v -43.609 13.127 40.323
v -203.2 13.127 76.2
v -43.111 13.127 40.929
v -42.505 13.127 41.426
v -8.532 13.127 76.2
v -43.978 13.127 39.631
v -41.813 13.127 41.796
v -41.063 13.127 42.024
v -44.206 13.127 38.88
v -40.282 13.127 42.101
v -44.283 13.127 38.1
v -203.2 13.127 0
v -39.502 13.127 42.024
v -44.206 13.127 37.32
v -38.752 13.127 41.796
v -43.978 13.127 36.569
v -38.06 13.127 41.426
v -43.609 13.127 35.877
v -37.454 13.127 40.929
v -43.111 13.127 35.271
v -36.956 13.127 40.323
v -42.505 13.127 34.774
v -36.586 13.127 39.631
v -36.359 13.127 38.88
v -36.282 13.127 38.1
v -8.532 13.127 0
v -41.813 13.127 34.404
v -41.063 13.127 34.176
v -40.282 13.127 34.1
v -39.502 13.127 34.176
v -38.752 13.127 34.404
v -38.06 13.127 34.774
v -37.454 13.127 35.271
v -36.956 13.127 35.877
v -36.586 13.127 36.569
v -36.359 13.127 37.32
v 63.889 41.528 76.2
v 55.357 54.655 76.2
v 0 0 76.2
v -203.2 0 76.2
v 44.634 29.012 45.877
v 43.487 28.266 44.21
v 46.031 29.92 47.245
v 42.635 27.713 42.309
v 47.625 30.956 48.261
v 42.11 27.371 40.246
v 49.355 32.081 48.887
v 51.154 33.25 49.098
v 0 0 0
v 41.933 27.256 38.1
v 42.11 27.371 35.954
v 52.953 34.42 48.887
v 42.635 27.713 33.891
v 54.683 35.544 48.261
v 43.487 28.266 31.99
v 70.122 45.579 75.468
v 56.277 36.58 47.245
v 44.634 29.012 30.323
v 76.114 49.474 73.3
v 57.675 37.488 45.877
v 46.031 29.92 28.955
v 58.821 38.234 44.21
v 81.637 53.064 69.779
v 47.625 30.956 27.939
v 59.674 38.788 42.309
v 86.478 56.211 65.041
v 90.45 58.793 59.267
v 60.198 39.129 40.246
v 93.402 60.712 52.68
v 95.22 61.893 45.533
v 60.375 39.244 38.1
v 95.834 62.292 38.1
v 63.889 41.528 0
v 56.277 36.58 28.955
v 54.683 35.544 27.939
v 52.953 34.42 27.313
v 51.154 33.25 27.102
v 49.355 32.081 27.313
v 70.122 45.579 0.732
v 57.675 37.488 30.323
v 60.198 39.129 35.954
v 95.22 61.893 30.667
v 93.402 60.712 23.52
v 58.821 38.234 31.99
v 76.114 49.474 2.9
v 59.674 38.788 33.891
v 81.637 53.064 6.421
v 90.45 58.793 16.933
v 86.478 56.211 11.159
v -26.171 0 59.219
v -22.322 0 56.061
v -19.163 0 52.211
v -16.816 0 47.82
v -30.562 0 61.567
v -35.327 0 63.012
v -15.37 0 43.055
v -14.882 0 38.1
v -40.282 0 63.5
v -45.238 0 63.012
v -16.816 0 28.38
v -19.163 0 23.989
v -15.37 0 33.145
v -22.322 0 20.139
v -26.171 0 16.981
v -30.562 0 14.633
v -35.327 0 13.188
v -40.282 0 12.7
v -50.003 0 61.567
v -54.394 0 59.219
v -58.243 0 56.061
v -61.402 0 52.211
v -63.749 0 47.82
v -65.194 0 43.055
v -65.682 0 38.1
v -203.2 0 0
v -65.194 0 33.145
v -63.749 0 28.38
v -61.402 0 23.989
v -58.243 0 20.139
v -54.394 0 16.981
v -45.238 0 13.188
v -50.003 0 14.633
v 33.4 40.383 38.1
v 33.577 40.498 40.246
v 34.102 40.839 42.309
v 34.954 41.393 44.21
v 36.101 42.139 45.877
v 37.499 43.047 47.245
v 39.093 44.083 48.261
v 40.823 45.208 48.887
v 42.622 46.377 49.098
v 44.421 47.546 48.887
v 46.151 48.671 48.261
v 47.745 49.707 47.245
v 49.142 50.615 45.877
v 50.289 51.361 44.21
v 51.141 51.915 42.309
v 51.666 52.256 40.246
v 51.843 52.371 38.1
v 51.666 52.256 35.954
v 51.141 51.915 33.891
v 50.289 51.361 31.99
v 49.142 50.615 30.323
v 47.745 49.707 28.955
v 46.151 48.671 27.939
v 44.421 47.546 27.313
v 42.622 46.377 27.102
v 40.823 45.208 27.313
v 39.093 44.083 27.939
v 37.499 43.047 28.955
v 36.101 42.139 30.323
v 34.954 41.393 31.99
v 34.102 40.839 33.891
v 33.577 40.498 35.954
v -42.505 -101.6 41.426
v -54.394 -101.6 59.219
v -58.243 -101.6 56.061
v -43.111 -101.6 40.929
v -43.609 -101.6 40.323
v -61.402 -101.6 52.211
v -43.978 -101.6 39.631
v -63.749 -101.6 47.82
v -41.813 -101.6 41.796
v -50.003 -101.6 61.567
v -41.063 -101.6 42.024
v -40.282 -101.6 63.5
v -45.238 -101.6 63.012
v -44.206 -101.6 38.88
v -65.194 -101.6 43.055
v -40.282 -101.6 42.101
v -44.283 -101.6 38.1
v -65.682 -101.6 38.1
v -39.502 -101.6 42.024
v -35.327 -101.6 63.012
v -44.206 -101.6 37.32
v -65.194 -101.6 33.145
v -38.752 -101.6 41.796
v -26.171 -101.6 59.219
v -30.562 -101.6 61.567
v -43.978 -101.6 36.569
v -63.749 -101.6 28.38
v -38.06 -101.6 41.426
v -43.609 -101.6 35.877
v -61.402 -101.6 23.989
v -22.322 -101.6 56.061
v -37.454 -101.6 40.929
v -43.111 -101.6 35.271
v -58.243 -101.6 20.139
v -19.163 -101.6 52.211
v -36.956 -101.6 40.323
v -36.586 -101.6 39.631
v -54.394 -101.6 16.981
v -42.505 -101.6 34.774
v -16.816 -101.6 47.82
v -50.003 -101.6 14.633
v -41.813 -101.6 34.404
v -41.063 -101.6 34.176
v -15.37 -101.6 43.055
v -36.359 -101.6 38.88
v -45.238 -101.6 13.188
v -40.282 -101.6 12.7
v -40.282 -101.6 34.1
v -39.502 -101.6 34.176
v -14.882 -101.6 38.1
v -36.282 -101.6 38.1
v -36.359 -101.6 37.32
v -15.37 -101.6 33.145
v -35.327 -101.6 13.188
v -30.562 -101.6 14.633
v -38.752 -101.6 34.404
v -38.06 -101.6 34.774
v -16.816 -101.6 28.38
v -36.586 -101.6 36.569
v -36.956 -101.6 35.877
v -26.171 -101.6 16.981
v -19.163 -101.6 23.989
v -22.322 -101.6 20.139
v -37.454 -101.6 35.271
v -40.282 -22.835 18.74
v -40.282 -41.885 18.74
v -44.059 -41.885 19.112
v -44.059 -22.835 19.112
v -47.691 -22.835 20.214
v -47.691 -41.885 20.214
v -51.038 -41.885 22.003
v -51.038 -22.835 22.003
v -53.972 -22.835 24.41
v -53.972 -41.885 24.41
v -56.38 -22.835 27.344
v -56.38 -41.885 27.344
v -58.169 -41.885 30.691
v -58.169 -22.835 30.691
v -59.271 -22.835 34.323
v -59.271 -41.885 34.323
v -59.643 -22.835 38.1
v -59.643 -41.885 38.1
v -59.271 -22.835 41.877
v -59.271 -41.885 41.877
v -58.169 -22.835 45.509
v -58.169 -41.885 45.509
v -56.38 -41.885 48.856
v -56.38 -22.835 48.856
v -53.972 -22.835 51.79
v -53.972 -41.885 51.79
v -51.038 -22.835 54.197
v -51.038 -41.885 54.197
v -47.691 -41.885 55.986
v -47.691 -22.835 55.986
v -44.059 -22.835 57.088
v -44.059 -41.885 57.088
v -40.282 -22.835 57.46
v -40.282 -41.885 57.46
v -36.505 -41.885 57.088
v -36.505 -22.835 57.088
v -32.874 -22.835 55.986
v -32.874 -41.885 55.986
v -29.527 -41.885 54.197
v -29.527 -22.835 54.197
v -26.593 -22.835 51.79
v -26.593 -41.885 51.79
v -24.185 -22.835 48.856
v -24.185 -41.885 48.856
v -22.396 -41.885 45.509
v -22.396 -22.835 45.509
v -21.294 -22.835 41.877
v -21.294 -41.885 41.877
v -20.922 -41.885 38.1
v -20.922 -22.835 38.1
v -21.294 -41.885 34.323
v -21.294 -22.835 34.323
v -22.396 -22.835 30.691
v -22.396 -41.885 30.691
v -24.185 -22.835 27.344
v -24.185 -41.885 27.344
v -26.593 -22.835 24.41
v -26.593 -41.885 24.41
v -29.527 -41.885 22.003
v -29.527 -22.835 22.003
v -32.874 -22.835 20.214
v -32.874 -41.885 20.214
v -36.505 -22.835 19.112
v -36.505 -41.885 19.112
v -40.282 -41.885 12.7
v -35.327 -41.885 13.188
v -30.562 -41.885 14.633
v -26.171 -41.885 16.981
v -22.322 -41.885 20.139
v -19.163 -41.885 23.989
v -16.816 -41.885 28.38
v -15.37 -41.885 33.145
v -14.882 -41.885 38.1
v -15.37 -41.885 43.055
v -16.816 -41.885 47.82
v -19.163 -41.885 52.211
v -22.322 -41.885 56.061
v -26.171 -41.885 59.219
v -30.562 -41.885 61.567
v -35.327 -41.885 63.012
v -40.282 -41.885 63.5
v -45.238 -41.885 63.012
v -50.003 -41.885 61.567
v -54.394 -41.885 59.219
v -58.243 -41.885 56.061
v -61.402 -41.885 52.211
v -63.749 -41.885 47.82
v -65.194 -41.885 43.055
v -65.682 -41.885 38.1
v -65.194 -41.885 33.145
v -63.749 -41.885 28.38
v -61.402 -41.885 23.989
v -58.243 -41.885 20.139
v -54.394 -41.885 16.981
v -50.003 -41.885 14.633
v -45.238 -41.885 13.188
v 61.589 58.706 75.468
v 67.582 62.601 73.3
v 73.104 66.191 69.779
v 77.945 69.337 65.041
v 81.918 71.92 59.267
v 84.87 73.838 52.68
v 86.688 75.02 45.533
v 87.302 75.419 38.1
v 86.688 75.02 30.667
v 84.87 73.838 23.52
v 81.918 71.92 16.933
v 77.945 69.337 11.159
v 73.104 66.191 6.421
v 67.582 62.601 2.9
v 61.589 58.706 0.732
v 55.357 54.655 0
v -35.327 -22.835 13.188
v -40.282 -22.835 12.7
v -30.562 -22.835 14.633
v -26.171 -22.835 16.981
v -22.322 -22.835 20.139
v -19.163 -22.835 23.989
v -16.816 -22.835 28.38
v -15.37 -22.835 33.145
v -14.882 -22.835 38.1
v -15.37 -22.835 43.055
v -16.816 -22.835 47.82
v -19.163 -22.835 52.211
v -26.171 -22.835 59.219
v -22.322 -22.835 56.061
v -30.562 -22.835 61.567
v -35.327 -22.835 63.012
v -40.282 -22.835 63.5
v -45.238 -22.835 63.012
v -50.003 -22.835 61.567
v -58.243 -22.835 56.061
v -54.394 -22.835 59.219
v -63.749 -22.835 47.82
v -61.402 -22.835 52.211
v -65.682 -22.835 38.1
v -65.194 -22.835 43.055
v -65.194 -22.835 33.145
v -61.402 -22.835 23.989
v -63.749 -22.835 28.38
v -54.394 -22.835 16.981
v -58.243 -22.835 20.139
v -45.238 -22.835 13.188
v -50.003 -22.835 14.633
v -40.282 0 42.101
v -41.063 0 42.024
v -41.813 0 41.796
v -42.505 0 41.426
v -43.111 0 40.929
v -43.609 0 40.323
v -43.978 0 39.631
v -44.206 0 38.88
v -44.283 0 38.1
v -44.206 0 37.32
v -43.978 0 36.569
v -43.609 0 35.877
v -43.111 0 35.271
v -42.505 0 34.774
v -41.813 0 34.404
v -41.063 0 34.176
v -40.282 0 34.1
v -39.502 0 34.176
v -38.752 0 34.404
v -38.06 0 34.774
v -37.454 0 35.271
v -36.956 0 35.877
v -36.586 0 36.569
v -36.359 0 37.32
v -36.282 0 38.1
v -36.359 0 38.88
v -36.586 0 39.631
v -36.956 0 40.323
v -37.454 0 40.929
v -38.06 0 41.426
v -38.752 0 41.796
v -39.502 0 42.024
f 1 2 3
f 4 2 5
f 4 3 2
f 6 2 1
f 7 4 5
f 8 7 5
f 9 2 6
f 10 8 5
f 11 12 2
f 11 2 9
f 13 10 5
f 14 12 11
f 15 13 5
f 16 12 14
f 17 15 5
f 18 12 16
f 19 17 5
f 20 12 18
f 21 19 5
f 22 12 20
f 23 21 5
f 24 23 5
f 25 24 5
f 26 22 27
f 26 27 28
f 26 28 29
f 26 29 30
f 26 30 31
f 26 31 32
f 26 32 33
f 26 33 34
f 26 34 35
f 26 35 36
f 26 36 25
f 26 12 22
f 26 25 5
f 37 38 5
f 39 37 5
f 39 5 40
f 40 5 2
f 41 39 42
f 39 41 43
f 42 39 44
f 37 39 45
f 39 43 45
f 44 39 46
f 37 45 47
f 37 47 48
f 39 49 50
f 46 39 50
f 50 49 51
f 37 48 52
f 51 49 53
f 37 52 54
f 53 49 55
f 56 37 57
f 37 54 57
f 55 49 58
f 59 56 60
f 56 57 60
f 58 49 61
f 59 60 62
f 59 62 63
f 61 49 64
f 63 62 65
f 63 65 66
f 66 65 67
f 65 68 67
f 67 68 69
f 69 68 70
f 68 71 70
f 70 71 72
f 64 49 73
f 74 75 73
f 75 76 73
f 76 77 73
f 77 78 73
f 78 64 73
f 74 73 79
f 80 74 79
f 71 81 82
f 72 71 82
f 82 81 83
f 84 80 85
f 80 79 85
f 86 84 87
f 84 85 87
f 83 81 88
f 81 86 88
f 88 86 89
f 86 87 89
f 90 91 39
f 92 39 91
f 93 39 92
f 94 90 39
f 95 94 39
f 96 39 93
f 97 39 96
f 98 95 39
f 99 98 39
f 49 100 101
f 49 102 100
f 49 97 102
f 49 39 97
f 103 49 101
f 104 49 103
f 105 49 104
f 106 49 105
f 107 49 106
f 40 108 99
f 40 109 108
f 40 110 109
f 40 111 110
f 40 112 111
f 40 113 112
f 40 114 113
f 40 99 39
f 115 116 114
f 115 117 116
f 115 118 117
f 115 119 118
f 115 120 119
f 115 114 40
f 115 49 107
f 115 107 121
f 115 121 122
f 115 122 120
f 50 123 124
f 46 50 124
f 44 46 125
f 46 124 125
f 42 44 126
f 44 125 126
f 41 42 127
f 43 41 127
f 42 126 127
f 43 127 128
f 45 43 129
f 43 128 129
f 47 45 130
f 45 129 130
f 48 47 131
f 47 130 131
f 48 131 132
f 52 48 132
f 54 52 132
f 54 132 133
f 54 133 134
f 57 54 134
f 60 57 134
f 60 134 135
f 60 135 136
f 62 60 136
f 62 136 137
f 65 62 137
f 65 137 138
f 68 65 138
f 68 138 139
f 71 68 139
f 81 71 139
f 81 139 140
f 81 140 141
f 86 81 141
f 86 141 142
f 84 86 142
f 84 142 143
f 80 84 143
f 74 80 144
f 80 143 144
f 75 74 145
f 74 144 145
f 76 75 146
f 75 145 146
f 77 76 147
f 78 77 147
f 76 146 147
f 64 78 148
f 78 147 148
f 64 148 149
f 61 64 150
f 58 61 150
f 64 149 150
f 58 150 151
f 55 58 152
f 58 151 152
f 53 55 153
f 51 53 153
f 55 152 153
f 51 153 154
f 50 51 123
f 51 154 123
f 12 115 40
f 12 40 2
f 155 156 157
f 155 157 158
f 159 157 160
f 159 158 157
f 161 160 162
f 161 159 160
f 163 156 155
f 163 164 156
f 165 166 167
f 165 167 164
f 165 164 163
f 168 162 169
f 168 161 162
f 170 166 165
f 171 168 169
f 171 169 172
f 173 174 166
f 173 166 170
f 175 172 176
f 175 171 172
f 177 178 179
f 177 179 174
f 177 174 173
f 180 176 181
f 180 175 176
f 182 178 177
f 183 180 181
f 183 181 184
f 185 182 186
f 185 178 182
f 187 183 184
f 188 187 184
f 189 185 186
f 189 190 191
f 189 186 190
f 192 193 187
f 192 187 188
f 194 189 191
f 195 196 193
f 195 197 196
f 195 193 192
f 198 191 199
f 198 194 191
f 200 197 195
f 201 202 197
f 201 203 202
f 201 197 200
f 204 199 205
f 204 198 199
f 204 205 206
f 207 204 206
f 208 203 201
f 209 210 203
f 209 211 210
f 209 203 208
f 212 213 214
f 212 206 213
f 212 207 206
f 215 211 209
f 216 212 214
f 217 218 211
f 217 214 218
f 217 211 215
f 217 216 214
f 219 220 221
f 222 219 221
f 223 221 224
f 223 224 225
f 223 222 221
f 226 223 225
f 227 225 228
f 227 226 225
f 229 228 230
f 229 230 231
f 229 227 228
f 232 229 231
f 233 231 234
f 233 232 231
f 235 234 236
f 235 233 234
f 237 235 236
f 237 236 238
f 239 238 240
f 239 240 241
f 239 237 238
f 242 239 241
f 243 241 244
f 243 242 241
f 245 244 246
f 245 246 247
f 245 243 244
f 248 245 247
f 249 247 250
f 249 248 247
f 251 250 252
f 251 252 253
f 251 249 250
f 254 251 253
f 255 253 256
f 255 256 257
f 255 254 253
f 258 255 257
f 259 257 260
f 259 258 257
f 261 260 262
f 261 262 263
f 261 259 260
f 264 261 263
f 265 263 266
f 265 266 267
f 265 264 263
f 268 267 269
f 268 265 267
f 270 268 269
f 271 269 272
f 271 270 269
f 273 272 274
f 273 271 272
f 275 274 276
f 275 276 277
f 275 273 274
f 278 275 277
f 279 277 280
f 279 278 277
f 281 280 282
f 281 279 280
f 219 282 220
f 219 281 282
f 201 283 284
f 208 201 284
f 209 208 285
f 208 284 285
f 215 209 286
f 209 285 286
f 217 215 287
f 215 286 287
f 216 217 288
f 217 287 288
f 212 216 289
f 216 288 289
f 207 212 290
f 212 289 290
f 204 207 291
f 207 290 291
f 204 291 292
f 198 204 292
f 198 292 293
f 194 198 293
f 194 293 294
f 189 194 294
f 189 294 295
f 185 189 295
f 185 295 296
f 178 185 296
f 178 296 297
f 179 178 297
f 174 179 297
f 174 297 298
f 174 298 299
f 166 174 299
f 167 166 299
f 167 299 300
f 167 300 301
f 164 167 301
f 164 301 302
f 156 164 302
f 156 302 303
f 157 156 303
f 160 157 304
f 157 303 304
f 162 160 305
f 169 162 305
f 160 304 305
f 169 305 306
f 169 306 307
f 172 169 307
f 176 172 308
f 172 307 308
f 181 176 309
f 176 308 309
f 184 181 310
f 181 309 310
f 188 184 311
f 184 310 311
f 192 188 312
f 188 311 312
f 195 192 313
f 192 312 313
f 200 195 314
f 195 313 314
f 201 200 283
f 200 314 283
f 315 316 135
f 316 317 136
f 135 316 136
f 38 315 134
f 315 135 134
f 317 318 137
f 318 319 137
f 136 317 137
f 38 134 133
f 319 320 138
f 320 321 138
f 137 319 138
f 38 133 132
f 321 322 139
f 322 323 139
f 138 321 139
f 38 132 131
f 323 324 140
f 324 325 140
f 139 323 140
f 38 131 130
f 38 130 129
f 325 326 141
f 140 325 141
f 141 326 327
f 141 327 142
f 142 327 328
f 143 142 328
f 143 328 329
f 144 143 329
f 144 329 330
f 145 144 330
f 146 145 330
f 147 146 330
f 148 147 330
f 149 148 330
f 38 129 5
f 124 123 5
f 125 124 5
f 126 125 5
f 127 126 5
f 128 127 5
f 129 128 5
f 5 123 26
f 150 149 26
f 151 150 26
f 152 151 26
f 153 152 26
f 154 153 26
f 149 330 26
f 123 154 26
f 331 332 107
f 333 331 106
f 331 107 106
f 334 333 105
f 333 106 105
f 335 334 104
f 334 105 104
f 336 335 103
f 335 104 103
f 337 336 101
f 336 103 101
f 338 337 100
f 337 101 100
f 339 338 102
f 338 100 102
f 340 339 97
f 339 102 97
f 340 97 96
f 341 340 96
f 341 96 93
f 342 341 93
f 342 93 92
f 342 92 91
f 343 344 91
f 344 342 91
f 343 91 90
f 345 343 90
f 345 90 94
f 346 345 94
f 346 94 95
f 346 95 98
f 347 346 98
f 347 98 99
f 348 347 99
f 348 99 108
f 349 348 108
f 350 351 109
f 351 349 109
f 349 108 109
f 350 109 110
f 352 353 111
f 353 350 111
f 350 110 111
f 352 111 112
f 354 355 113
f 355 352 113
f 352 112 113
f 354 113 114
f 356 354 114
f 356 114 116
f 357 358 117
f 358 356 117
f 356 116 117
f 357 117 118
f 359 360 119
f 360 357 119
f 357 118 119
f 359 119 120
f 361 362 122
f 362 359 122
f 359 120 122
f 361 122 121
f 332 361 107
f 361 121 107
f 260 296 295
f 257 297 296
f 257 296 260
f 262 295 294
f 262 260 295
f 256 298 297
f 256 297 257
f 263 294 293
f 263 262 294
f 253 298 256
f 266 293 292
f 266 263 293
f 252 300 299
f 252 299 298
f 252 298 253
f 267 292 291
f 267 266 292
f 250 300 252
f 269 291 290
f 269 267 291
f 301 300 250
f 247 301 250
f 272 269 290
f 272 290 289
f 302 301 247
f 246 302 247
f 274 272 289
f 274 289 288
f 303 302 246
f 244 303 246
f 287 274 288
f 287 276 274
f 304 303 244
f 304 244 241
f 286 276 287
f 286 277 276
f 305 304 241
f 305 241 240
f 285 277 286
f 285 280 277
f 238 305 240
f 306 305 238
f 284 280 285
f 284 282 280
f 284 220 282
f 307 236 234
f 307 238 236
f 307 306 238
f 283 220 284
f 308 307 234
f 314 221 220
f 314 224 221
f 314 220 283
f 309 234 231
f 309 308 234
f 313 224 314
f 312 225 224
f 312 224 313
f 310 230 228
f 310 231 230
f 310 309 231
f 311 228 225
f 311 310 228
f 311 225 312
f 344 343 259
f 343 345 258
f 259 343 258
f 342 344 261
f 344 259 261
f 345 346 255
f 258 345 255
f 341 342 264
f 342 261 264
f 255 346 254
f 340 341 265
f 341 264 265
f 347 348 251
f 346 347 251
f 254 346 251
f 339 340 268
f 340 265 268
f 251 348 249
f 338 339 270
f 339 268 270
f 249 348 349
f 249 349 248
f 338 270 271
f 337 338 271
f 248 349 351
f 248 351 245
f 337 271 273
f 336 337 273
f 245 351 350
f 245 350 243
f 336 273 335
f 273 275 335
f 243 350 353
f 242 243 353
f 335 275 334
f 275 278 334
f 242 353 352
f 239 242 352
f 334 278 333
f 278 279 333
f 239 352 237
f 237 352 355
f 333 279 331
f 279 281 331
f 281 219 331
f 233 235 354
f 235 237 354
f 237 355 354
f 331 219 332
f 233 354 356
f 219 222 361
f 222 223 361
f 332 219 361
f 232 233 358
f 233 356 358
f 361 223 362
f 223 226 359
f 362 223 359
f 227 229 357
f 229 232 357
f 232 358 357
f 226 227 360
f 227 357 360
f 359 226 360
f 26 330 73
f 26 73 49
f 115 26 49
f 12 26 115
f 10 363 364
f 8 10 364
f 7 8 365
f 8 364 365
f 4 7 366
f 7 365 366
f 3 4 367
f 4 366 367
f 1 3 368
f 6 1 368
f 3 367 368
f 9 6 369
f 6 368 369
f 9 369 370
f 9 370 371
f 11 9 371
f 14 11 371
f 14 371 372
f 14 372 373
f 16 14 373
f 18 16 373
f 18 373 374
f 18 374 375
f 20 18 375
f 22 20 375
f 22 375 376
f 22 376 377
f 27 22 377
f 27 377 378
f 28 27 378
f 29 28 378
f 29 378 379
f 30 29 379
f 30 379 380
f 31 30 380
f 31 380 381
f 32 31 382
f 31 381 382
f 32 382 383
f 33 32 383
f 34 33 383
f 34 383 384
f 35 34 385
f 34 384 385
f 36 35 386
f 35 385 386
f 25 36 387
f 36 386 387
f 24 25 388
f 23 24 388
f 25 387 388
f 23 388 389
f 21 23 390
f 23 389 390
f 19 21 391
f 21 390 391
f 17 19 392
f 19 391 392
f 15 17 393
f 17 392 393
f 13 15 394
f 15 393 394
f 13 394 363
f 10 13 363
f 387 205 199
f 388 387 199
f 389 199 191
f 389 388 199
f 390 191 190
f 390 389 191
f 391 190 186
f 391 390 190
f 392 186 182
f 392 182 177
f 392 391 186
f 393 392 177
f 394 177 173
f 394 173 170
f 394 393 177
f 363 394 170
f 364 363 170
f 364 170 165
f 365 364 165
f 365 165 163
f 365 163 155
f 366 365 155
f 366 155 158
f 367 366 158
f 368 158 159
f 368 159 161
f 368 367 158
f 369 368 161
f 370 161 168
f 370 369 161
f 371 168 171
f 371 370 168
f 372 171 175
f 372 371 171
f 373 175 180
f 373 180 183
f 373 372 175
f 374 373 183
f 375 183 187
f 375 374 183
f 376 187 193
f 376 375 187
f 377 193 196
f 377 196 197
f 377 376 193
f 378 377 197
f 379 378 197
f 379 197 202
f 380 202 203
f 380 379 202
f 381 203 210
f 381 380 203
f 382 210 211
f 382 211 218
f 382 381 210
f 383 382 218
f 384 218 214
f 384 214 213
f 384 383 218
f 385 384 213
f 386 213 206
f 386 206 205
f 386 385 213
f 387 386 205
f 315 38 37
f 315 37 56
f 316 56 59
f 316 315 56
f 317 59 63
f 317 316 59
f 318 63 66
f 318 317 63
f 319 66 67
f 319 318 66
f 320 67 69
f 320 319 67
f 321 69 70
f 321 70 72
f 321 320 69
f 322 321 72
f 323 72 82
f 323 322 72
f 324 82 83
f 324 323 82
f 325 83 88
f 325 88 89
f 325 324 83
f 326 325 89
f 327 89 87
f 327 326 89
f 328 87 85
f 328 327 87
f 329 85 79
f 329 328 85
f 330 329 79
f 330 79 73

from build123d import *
from build123d.topology import SkipClean

# Parameters (mm, degrees)
BOSS_EXTRUDE1_DEPTH = 76.2
SKETCH2_R           = 25.4
SKETCH2_R_2         = 4.0005
BOSS_EXTRUDE2_DEPTH = 101.6
SKETCH4_W           = 6.35
SKETCH4_H           = 19.05
SKETCH5_R           = 4.0005
CUT_EXTRUDE1_DEPTH  = 240.623120754
SKETCH7_R           = 10.9982
CUT_EXTRUDE2_DEPTH  = 239.462040028
CUT_EXTRUDE3_DEPTH  = 239.462040028


with BuildPart() as part:
    # Sketch1 → Boss-Extrude1 (new body)
    with BuildSketch(Plane.XY):
        Polygon((-203.2, 13.126834176), (-8.532442214, 13.126834176), (0, 0), (-203.2, 0), align=None)
        Polygon((119.24636491, 96.183058807), (-8.532442214, 13.126834176), (0, 0), (127.778807124, 83.056224631), align=None)
    extrude(amount=BOSS_EXTRUDE1_DEPTH)

    # Sketch2 → Boss-Extrude2 (add)
    with BuildSketch(Plane.XZ):
        with Locations(Location((-40.282442214, 38.1, 0), (0, 0, 270))):
            Circle(SKETCH2_R)
        with Locations((-40.282442214, 38.1)):
            Circle(SKETCH2_R_2, mode=Mode.SUBTRACT)
    extrude(amount=BOSS_EXTRUDE2_DEPTH)

    # Sketch4 → Cut-Revolve1 (revolve, cut)
    with BuildSketch(Plane.XY.offset(38.1), mode=Mode.PRIVATE) as cut_revolve1_sk:
        with Locations((-62.817567444, -32.3596)):
            Rectangle(SKETCH4_W, SKETCH4_H)
    revolve(cut_revolve1_sk.sketch.rotate(Axis((-40.282442214, -101.6, 38.1), (0, 1, 0)), 270), axis=Axis((-40.282442214, -101.6, 38.1), (0, 1, 0)), mode=Mode.SUBTRACT)

    # Sketch5 → Cut-Extrude1 (cut, through all)
    with SkipClean():  # the faces are left unmerged after this step: merging them gives an invalid solid
        with BuildSketch(Plane.XZ):
            with Locations(Location((-40.282442214, 38.1, 0), (0, 0, 90))):
                Circle(SKETCH5_R)
        extrude(amount=-CUT_EXTRUDE1_DEPTH, mode=Mode.SUBTRACT)

    # Sketch7 → Cut-Extrude2 (cut, through all)
    with SkipClean():  # the faces are left unmerged after this step: merging them gives an invalid solid
        with BuildSketch(Plane(origin=(-8.532442214, 13.126834176, 0), x_dir=(0.8384436163006369, 0.5449883505954145, 0), z_dir=(-0.5449883505954145, 0.838443616300637, 0))):
            with Locations(Location((61.0108, -38.1, 0), (0, 0, 180))):
                Circle(SKETCH7_R)
        extrude(amount=-CUT_EXTRUDE2_DEPTH, mode=Mode.SUBTRACT)

    # Sketch8 → Cut-Extrude3 (cut, through all)
    with SkipClean():  # the faces are left unmerged after this step: merging them gives an invalid solid
        with BuildSketch(Plane(origin=(-8.532442214, 13.126834176, 0), x_dir=(0.8384436163006369, 0.5449883505954145, 0), z_dir=(-0.5449883505954145, 0.838443616300637, 0))):
            with BuildLine():
                Line((76.2, 0), (152.4, 0))
                Line((152.4, 0), (152.4, -76.2))
                Line((152.4, -76.2), (76.2, -76.2))
                ThreePointArc((76.2, -76.2), (114.3, -38.1), (76.2, 0))
            make_face()
        extrude(amount=-CUT_EXTRUDE3_DEPTH, mode=Mode.SUBTRACT)


solid = part.part
